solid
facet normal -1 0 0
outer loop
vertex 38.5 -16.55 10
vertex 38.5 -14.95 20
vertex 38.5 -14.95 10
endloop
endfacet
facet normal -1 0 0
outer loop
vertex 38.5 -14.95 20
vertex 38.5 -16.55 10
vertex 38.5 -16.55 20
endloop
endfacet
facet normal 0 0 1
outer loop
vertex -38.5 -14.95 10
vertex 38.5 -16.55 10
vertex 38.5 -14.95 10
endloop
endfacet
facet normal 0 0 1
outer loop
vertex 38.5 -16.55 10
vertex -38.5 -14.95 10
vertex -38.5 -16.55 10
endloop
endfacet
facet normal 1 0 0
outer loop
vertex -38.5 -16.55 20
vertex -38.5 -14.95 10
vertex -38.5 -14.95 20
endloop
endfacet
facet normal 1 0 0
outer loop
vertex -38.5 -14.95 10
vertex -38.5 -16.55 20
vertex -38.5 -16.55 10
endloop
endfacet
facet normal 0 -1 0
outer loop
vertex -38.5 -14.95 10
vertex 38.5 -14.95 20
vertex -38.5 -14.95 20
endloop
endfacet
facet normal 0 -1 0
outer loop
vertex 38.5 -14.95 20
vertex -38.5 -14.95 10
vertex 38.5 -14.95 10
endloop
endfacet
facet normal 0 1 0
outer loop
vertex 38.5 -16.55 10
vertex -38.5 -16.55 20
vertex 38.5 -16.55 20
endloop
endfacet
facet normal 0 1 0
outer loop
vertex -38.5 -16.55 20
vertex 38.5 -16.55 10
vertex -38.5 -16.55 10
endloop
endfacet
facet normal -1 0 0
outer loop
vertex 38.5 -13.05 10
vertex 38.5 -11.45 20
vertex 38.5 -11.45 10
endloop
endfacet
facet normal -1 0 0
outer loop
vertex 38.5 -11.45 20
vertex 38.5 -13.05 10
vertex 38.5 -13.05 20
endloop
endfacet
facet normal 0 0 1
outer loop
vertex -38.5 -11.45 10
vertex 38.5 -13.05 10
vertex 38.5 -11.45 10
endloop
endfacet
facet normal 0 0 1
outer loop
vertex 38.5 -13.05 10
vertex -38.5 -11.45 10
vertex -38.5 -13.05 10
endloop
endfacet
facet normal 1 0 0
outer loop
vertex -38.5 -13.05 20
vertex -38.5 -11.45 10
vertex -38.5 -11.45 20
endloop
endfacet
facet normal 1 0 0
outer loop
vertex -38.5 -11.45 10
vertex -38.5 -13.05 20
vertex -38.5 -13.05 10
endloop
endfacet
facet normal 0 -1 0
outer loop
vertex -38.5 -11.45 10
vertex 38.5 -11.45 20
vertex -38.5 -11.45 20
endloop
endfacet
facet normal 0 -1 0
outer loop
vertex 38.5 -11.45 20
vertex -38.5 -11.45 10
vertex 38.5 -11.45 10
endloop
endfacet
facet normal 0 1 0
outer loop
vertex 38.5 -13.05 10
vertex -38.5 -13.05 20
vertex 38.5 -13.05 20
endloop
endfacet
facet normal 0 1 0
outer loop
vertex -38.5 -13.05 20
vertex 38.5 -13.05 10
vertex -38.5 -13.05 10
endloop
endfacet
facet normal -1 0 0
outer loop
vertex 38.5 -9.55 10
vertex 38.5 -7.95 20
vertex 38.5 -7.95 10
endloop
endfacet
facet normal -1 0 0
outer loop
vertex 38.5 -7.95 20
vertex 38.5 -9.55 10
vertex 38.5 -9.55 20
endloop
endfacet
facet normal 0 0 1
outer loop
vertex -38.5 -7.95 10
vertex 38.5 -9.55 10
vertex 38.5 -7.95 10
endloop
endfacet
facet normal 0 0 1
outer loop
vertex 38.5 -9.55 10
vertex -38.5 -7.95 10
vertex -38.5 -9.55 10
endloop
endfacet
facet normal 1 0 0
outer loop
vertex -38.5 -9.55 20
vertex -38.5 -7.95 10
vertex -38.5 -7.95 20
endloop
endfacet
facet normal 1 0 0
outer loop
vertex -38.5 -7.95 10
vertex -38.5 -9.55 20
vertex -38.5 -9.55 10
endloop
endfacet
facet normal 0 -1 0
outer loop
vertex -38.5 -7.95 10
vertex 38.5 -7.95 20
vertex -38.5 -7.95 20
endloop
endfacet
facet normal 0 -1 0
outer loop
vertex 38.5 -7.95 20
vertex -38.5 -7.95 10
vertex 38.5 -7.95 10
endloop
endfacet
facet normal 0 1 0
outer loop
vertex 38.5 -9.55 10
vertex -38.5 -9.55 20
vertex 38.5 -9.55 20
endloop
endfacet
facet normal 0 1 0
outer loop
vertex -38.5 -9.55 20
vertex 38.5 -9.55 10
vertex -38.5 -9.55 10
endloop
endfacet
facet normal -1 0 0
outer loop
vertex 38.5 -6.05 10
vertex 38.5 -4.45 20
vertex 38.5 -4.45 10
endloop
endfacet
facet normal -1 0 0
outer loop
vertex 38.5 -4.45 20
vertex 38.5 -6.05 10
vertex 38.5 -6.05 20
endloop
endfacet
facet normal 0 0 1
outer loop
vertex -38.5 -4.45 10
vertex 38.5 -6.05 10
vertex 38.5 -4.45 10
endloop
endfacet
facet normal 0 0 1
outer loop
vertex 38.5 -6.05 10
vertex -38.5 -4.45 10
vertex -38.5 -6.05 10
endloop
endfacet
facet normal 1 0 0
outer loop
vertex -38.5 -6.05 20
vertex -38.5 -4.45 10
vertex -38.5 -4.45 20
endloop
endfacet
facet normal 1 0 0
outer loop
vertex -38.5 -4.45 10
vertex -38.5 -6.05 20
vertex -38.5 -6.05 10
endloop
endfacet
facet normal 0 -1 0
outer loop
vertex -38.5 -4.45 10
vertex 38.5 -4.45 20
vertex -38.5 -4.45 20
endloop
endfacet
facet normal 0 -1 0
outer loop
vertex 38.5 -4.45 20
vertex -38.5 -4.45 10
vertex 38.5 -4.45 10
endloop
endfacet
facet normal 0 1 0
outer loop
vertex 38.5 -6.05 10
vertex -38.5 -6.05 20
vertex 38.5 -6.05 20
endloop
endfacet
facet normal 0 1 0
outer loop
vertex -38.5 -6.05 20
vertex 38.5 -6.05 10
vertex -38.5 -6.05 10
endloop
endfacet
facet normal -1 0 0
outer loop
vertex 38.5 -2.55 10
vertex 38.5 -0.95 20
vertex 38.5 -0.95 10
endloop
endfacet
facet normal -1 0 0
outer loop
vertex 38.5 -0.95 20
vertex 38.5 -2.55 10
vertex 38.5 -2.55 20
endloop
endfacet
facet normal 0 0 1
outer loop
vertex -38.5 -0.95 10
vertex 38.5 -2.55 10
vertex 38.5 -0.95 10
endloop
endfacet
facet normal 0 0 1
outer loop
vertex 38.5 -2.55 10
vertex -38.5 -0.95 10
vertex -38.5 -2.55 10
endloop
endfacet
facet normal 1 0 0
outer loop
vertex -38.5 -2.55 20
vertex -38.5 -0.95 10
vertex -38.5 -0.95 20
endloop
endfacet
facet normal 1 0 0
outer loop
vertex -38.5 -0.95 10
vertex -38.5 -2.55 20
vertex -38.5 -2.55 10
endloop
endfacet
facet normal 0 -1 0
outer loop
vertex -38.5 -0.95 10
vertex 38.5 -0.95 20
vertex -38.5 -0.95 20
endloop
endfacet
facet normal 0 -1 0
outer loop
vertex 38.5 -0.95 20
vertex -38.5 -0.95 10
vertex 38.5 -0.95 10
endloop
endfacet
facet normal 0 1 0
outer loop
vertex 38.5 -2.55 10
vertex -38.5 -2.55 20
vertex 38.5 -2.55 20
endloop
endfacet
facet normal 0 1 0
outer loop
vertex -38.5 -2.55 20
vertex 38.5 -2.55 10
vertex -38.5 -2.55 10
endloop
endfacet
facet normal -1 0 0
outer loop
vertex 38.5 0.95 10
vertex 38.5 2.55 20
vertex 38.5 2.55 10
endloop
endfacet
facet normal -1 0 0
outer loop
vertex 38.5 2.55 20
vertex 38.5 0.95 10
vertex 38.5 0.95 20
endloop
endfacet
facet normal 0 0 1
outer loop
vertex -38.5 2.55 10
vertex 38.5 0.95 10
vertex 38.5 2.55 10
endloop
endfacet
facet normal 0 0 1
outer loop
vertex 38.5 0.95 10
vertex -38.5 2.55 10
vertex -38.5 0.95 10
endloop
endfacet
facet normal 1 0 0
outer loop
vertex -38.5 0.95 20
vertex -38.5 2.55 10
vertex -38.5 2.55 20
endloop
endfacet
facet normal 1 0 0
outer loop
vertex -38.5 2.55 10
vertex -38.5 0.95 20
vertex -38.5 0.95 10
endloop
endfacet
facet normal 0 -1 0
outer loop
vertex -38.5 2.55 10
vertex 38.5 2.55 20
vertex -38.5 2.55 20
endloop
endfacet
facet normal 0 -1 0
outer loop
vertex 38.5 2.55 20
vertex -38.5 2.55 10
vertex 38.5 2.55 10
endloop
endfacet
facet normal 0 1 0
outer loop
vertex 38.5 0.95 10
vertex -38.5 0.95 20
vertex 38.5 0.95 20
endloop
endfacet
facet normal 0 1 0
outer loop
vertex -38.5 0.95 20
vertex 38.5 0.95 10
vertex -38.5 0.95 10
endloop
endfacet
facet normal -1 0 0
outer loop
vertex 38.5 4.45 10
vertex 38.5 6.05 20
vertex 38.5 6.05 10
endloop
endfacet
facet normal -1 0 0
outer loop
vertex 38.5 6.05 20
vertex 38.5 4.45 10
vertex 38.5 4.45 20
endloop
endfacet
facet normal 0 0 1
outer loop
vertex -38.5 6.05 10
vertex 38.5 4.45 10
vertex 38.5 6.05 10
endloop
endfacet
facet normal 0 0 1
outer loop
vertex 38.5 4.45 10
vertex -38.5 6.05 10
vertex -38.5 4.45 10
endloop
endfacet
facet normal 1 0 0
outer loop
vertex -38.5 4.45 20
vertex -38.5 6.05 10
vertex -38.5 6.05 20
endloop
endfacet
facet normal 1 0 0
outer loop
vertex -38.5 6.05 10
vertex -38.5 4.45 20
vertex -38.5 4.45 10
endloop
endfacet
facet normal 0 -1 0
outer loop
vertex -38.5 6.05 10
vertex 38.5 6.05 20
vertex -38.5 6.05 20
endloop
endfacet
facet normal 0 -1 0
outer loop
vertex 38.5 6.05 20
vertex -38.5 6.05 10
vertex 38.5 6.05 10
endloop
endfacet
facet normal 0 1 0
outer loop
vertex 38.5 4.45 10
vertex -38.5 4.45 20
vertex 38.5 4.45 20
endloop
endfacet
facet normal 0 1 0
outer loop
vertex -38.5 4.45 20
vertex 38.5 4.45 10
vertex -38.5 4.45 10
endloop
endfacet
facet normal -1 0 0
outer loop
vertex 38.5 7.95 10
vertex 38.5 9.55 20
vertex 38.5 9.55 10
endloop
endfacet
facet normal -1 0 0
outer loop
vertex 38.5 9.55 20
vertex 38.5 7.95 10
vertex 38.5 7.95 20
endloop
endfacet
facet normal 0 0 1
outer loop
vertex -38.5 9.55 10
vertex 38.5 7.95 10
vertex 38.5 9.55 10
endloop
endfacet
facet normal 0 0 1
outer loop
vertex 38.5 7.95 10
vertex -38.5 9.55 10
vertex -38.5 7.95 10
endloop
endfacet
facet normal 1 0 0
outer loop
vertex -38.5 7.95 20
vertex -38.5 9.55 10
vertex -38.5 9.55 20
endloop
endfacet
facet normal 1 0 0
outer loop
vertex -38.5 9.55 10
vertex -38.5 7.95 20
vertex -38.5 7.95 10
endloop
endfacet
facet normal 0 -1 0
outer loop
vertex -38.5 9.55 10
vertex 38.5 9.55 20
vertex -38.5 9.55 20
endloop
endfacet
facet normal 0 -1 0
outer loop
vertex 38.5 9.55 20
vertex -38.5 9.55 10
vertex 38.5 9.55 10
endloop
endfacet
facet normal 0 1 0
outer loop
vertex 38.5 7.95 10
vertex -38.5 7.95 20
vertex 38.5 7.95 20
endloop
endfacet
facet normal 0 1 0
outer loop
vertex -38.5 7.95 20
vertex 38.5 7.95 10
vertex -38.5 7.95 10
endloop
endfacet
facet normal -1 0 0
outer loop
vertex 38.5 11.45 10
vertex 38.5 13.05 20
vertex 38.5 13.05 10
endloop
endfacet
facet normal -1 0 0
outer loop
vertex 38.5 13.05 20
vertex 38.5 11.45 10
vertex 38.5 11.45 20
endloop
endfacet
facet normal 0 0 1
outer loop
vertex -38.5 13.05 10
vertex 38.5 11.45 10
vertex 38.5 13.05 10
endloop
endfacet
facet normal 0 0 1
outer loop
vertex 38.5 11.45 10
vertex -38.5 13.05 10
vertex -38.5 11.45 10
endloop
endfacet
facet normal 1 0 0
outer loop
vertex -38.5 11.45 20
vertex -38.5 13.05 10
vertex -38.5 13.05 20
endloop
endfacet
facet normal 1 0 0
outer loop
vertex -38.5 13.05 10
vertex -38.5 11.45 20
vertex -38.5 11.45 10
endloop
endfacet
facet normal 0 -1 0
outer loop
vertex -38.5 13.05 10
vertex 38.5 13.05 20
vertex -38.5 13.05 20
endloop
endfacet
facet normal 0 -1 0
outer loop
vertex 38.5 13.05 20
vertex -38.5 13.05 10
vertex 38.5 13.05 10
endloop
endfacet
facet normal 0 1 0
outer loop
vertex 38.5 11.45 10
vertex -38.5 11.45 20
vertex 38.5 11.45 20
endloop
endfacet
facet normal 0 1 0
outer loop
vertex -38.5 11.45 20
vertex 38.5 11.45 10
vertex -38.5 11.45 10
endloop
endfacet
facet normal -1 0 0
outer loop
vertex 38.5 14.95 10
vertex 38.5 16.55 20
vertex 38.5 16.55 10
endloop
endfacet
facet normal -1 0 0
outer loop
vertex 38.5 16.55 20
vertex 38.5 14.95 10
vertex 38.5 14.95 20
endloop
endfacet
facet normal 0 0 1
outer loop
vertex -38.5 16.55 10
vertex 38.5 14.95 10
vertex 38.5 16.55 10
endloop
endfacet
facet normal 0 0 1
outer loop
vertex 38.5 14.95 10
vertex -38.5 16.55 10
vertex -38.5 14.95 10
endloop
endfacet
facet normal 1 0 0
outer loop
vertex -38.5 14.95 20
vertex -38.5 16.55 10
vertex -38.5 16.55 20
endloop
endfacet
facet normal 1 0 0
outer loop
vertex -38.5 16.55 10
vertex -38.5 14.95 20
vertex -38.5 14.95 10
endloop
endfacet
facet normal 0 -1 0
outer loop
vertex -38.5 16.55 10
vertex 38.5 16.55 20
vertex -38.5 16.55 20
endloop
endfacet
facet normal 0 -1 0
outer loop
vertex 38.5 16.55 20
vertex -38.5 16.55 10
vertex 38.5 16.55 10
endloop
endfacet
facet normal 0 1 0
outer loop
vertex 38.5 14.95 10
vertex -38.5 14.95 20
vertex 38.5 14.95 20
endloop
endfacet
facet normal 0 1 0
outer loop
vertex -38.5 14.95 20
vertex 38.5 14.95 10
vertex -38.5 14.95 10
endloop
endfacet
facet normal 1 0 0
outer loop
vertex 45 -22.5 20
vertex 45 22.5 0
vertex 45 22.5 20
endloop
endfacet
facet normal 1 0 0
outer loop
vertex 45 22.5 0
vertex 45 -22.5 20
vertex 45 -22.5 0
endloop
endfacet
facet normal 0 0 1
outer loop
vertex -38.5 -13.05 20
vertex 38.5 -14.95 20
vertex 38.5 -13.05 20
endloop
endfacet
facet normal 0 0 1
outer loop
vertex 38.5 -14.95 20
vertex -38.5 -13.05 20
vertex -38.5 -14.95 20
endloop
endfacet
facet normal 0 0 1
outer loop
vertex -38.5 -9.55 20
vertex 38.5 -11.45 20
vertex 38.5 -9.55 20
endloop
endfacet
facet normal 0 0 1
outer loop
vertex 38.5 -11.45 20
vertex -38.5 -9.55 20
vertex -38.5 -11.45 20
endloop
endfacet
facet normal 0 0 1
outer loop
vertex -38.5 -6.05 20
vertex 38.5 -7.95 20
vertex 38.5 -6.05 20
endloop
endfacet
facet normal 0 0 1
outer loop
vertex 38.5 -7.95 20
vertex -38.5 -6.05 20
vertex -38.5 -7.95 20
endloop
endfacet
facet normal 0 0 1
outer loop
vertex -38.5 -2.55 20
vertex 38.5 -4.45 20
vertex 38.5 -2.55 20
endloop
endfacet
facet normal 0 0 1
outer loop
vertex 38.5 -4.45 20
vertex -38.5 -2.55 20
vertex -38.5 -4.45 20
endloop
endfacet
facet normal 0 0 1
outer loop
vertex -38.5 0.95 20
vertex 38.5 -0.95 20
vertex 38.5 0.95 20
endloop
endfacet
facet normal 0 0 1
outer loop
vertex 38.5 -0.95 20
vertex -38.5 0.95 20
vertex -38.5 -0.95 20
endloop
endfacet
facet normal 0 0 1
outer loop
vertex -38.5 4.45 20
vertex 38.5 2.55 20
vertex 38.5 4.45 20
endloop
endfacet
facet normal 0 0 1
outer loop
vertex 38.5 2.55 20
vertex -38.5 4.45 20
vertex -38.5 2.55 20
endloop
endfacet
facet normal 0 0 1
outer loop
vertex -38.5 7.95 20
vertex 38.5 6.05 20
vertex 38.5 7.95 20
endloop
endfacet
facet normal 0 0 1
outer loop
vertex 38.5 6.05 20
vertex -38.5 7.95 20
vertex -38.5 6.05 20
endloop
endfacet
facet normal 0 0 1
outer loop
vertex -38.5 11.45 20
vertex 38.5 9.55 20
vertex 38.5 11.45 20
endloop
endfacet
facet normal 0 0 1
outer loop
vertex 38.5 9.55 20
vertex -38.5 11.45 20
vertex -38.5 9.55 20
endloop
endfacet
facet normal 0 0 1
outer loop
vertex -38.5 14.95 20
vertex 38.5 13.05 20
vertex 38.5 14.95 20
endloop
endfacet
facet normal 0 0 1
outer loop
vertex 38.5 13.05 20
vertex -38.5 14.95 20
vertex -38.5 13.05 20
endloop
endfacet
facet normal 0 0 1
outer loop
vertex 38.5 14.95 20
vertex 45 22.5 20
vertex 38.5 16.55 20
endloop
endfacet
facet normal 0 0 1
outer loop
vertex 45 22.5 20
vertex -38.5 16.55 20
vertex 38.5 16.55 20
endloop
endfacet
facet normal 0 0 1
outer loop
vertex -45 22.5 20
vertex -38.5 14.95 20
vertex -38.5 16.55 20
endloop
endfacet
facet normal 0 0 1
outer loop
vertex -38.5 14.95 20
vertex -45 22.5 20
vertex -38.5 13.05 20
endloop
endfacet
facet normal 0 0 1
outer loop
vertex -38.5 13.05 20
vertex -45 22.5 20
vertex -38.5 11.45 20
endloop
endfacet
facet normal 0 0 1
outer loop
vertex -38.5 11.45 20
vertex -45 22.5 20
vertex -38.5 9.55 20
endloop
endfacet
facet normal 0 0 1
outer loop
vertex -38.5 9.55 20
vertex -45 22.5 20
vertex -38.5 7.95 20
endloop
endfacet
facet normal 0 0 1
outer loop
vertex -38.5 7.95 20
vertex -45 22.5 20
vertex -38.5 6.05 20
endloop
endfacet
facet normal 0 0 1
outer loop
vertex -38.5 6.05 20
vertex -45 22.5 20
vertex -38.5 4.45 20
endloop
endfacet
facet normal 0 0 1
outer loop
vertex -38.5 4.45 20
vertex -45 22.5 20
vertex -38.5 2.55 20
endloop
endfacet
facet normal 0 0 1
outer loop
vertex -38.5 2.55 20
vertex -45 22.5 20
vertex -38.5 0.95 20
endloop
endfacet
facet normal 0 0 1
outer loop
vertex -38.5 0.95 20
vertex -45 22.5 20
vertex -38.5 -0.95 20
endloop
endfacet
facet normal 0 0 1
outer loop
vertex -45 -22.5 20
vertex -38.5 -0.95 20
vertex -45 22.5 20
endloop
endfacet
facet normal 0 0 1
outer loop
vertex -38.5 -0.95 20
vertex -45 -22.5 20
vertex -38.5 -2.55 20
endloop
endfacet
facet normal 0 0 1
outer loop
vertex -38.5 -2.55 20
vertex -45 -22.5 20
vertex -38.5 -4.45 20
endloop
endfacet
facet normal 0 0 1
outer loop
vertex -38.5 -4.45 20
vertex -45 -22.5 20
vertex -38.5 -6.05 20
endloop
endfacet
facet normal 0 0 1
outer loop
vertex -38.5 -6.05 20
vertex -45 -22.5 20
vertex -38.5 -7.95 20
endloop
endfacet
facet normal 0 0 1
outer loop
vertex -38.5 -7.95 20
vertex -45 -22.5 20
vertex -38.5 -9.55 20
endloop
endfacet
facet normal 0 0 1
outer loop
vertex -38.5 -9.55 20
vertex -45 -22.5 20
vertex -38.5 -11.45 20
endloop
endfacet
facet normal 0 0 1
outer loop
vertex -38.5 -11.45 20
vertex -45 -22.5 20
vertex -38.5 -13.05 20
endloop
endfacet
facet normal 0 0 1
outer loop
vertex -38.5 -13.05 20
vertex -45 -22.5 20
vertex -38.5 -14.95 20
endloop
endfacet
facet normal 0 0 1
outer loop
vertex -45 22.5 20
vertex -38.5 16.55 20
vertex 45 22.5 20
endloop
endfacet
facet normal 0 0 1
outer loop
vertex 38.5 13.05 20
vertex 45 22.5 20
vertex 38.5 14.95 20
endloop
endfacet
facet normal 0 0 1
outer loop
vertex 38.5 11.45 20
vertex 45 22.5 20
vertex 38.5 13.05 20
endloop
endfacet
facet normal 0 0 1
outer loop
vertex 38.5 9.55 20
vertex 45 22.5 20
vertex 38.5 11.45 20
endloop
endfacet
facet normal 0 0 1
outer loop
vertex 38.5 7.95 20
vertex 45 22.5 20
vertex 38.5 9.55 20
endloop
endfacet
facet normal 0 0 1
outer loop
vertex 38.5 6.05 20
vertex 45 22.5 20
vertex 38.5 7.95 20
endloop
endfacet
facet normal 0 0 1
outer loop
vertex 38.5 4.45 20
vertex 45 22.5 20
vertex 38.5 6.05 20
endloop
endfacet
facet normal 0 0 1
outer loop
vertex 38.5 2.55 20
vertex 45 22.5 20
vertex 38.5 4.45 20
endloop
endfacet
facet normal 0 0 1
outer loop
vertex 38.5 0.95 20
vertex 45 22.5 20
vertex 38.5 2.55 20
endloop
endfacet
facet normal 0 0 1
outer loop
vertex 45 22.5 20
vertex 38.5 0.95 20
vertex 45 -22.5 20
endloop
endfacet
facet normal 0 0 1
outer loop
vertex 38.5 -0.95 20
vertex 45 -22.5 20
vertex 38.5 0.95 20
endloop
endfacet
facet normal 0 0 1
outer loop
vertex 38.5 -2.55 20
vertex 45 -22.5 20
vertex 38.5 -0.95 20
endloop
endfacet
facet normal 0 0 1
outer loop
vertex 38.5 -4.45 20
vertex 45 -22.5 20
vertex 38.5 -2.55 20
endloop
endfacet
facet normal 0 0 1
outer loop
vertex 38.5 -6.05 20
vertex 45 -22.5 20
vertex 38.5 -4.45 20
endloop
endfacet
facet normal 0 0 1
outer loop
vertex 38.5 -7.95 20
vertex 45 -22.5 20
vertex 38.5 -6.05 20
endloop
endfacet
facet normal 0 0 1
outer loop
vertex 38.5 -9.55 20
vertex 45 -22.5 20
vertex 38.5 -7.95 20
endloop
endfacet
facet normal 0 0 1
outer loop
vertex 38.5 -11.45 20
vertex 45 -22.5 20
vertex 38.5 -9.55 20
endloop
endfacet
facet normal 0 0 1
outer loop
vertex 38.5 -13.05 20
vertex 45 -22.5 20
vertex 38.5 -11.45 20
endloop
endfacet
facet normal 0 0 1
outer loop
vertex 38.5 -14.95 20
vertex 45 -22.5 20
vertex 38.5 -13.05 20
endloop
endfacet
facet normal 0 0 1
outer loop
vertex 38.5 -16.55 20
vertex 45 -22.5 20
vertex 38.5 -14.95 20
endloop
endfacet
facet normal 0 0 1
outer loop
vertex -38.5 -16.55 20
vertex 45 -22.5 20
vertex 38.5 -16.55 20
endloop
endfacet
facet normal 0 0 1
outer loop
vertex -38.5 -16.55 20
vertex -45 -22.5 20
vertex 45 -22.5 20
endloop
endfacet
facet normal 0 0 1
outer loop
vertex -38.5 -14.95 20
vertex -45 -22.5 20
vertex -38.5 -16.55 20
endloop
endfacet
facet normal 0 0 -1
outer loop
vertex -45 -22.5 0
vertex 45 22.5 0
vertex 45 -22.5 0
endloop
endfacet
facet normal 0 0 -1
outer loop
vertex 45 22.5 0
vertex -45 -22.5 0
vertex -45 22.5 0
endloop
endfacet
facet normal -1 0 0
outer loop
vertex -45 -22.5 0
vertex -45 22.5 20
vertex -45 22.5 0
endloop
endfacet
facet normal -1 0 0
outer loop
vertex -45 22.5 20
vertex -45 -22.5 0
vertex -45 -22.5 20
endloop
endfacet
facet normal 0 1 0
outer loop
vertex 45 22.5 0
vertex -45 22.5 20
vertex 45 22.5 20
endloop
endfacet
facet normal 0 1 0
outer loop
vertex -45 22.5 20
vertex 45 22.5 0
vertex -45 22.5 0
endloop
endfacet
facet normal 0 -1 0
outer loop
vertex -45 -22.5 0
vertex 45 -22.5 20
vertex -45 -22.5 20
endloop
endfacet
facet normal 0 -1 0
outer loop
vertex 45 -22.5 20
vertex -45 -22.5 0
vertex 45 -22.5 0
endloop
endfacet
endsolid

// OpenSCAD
// Drying rack for 10 microscope slides (75 x 25 x 1 mm)
// Slides stand upright on their long edge, held in slots cut into the top face.

// ---- Base block dimensions (measured with calipers) ----
base_L = 90;   // length along X
base_W = 45;   // width  along Y
base_H = 20;   // height along Z

// ---- Slot dimensions ----
slot_L   = 77;   // slot length along X
slot_W   = 1.6;  // slot width  along Y
slot_D   = 10;   // slot depth  along Z (open at top)
slot_Pitch = 3.5; // centre-to-centre spacing in Y
n_slots  = 10;   // number of slots

// ---- Derived slot positions (centred on origin in X and Y) ----
// For 10 slots with 3.5 mm pitch, the Y-centres are:
// y_i = (i - (n_slots-1)/2) * slot_Pitch,  i = 0..9
// This gives a symmetric group centred at Y = 0.

$fn = 64;

// ---- Build the rack ----
difference() {
    // Solid base block, resting on z=0, centred on origin in X and Y
    translate([-base_L/2, -base_W/2, 0])
        cube([base_L, base_W, base_H]);

    // Cut 10 parallel slots into the top face
    for (i = [0 : n_slots-1]) {
        y_c = (i - (n_slots - 1) / 2) * slot_Pitch;

        // Each slot: 77 mm long (X), 1.6 mm wide (Y), 10 mm deep (Z), open at top.
        // The cutter extends 1 mm above the top face (z = base_H) to avoid coplanar faces.
        translate([-slot_L/2, y_c - slot_W/2, base_H - slot_D])
            cube([slot_L, slot_W, slot_D + 1]);  // +1 mm past the top face
    }
}
